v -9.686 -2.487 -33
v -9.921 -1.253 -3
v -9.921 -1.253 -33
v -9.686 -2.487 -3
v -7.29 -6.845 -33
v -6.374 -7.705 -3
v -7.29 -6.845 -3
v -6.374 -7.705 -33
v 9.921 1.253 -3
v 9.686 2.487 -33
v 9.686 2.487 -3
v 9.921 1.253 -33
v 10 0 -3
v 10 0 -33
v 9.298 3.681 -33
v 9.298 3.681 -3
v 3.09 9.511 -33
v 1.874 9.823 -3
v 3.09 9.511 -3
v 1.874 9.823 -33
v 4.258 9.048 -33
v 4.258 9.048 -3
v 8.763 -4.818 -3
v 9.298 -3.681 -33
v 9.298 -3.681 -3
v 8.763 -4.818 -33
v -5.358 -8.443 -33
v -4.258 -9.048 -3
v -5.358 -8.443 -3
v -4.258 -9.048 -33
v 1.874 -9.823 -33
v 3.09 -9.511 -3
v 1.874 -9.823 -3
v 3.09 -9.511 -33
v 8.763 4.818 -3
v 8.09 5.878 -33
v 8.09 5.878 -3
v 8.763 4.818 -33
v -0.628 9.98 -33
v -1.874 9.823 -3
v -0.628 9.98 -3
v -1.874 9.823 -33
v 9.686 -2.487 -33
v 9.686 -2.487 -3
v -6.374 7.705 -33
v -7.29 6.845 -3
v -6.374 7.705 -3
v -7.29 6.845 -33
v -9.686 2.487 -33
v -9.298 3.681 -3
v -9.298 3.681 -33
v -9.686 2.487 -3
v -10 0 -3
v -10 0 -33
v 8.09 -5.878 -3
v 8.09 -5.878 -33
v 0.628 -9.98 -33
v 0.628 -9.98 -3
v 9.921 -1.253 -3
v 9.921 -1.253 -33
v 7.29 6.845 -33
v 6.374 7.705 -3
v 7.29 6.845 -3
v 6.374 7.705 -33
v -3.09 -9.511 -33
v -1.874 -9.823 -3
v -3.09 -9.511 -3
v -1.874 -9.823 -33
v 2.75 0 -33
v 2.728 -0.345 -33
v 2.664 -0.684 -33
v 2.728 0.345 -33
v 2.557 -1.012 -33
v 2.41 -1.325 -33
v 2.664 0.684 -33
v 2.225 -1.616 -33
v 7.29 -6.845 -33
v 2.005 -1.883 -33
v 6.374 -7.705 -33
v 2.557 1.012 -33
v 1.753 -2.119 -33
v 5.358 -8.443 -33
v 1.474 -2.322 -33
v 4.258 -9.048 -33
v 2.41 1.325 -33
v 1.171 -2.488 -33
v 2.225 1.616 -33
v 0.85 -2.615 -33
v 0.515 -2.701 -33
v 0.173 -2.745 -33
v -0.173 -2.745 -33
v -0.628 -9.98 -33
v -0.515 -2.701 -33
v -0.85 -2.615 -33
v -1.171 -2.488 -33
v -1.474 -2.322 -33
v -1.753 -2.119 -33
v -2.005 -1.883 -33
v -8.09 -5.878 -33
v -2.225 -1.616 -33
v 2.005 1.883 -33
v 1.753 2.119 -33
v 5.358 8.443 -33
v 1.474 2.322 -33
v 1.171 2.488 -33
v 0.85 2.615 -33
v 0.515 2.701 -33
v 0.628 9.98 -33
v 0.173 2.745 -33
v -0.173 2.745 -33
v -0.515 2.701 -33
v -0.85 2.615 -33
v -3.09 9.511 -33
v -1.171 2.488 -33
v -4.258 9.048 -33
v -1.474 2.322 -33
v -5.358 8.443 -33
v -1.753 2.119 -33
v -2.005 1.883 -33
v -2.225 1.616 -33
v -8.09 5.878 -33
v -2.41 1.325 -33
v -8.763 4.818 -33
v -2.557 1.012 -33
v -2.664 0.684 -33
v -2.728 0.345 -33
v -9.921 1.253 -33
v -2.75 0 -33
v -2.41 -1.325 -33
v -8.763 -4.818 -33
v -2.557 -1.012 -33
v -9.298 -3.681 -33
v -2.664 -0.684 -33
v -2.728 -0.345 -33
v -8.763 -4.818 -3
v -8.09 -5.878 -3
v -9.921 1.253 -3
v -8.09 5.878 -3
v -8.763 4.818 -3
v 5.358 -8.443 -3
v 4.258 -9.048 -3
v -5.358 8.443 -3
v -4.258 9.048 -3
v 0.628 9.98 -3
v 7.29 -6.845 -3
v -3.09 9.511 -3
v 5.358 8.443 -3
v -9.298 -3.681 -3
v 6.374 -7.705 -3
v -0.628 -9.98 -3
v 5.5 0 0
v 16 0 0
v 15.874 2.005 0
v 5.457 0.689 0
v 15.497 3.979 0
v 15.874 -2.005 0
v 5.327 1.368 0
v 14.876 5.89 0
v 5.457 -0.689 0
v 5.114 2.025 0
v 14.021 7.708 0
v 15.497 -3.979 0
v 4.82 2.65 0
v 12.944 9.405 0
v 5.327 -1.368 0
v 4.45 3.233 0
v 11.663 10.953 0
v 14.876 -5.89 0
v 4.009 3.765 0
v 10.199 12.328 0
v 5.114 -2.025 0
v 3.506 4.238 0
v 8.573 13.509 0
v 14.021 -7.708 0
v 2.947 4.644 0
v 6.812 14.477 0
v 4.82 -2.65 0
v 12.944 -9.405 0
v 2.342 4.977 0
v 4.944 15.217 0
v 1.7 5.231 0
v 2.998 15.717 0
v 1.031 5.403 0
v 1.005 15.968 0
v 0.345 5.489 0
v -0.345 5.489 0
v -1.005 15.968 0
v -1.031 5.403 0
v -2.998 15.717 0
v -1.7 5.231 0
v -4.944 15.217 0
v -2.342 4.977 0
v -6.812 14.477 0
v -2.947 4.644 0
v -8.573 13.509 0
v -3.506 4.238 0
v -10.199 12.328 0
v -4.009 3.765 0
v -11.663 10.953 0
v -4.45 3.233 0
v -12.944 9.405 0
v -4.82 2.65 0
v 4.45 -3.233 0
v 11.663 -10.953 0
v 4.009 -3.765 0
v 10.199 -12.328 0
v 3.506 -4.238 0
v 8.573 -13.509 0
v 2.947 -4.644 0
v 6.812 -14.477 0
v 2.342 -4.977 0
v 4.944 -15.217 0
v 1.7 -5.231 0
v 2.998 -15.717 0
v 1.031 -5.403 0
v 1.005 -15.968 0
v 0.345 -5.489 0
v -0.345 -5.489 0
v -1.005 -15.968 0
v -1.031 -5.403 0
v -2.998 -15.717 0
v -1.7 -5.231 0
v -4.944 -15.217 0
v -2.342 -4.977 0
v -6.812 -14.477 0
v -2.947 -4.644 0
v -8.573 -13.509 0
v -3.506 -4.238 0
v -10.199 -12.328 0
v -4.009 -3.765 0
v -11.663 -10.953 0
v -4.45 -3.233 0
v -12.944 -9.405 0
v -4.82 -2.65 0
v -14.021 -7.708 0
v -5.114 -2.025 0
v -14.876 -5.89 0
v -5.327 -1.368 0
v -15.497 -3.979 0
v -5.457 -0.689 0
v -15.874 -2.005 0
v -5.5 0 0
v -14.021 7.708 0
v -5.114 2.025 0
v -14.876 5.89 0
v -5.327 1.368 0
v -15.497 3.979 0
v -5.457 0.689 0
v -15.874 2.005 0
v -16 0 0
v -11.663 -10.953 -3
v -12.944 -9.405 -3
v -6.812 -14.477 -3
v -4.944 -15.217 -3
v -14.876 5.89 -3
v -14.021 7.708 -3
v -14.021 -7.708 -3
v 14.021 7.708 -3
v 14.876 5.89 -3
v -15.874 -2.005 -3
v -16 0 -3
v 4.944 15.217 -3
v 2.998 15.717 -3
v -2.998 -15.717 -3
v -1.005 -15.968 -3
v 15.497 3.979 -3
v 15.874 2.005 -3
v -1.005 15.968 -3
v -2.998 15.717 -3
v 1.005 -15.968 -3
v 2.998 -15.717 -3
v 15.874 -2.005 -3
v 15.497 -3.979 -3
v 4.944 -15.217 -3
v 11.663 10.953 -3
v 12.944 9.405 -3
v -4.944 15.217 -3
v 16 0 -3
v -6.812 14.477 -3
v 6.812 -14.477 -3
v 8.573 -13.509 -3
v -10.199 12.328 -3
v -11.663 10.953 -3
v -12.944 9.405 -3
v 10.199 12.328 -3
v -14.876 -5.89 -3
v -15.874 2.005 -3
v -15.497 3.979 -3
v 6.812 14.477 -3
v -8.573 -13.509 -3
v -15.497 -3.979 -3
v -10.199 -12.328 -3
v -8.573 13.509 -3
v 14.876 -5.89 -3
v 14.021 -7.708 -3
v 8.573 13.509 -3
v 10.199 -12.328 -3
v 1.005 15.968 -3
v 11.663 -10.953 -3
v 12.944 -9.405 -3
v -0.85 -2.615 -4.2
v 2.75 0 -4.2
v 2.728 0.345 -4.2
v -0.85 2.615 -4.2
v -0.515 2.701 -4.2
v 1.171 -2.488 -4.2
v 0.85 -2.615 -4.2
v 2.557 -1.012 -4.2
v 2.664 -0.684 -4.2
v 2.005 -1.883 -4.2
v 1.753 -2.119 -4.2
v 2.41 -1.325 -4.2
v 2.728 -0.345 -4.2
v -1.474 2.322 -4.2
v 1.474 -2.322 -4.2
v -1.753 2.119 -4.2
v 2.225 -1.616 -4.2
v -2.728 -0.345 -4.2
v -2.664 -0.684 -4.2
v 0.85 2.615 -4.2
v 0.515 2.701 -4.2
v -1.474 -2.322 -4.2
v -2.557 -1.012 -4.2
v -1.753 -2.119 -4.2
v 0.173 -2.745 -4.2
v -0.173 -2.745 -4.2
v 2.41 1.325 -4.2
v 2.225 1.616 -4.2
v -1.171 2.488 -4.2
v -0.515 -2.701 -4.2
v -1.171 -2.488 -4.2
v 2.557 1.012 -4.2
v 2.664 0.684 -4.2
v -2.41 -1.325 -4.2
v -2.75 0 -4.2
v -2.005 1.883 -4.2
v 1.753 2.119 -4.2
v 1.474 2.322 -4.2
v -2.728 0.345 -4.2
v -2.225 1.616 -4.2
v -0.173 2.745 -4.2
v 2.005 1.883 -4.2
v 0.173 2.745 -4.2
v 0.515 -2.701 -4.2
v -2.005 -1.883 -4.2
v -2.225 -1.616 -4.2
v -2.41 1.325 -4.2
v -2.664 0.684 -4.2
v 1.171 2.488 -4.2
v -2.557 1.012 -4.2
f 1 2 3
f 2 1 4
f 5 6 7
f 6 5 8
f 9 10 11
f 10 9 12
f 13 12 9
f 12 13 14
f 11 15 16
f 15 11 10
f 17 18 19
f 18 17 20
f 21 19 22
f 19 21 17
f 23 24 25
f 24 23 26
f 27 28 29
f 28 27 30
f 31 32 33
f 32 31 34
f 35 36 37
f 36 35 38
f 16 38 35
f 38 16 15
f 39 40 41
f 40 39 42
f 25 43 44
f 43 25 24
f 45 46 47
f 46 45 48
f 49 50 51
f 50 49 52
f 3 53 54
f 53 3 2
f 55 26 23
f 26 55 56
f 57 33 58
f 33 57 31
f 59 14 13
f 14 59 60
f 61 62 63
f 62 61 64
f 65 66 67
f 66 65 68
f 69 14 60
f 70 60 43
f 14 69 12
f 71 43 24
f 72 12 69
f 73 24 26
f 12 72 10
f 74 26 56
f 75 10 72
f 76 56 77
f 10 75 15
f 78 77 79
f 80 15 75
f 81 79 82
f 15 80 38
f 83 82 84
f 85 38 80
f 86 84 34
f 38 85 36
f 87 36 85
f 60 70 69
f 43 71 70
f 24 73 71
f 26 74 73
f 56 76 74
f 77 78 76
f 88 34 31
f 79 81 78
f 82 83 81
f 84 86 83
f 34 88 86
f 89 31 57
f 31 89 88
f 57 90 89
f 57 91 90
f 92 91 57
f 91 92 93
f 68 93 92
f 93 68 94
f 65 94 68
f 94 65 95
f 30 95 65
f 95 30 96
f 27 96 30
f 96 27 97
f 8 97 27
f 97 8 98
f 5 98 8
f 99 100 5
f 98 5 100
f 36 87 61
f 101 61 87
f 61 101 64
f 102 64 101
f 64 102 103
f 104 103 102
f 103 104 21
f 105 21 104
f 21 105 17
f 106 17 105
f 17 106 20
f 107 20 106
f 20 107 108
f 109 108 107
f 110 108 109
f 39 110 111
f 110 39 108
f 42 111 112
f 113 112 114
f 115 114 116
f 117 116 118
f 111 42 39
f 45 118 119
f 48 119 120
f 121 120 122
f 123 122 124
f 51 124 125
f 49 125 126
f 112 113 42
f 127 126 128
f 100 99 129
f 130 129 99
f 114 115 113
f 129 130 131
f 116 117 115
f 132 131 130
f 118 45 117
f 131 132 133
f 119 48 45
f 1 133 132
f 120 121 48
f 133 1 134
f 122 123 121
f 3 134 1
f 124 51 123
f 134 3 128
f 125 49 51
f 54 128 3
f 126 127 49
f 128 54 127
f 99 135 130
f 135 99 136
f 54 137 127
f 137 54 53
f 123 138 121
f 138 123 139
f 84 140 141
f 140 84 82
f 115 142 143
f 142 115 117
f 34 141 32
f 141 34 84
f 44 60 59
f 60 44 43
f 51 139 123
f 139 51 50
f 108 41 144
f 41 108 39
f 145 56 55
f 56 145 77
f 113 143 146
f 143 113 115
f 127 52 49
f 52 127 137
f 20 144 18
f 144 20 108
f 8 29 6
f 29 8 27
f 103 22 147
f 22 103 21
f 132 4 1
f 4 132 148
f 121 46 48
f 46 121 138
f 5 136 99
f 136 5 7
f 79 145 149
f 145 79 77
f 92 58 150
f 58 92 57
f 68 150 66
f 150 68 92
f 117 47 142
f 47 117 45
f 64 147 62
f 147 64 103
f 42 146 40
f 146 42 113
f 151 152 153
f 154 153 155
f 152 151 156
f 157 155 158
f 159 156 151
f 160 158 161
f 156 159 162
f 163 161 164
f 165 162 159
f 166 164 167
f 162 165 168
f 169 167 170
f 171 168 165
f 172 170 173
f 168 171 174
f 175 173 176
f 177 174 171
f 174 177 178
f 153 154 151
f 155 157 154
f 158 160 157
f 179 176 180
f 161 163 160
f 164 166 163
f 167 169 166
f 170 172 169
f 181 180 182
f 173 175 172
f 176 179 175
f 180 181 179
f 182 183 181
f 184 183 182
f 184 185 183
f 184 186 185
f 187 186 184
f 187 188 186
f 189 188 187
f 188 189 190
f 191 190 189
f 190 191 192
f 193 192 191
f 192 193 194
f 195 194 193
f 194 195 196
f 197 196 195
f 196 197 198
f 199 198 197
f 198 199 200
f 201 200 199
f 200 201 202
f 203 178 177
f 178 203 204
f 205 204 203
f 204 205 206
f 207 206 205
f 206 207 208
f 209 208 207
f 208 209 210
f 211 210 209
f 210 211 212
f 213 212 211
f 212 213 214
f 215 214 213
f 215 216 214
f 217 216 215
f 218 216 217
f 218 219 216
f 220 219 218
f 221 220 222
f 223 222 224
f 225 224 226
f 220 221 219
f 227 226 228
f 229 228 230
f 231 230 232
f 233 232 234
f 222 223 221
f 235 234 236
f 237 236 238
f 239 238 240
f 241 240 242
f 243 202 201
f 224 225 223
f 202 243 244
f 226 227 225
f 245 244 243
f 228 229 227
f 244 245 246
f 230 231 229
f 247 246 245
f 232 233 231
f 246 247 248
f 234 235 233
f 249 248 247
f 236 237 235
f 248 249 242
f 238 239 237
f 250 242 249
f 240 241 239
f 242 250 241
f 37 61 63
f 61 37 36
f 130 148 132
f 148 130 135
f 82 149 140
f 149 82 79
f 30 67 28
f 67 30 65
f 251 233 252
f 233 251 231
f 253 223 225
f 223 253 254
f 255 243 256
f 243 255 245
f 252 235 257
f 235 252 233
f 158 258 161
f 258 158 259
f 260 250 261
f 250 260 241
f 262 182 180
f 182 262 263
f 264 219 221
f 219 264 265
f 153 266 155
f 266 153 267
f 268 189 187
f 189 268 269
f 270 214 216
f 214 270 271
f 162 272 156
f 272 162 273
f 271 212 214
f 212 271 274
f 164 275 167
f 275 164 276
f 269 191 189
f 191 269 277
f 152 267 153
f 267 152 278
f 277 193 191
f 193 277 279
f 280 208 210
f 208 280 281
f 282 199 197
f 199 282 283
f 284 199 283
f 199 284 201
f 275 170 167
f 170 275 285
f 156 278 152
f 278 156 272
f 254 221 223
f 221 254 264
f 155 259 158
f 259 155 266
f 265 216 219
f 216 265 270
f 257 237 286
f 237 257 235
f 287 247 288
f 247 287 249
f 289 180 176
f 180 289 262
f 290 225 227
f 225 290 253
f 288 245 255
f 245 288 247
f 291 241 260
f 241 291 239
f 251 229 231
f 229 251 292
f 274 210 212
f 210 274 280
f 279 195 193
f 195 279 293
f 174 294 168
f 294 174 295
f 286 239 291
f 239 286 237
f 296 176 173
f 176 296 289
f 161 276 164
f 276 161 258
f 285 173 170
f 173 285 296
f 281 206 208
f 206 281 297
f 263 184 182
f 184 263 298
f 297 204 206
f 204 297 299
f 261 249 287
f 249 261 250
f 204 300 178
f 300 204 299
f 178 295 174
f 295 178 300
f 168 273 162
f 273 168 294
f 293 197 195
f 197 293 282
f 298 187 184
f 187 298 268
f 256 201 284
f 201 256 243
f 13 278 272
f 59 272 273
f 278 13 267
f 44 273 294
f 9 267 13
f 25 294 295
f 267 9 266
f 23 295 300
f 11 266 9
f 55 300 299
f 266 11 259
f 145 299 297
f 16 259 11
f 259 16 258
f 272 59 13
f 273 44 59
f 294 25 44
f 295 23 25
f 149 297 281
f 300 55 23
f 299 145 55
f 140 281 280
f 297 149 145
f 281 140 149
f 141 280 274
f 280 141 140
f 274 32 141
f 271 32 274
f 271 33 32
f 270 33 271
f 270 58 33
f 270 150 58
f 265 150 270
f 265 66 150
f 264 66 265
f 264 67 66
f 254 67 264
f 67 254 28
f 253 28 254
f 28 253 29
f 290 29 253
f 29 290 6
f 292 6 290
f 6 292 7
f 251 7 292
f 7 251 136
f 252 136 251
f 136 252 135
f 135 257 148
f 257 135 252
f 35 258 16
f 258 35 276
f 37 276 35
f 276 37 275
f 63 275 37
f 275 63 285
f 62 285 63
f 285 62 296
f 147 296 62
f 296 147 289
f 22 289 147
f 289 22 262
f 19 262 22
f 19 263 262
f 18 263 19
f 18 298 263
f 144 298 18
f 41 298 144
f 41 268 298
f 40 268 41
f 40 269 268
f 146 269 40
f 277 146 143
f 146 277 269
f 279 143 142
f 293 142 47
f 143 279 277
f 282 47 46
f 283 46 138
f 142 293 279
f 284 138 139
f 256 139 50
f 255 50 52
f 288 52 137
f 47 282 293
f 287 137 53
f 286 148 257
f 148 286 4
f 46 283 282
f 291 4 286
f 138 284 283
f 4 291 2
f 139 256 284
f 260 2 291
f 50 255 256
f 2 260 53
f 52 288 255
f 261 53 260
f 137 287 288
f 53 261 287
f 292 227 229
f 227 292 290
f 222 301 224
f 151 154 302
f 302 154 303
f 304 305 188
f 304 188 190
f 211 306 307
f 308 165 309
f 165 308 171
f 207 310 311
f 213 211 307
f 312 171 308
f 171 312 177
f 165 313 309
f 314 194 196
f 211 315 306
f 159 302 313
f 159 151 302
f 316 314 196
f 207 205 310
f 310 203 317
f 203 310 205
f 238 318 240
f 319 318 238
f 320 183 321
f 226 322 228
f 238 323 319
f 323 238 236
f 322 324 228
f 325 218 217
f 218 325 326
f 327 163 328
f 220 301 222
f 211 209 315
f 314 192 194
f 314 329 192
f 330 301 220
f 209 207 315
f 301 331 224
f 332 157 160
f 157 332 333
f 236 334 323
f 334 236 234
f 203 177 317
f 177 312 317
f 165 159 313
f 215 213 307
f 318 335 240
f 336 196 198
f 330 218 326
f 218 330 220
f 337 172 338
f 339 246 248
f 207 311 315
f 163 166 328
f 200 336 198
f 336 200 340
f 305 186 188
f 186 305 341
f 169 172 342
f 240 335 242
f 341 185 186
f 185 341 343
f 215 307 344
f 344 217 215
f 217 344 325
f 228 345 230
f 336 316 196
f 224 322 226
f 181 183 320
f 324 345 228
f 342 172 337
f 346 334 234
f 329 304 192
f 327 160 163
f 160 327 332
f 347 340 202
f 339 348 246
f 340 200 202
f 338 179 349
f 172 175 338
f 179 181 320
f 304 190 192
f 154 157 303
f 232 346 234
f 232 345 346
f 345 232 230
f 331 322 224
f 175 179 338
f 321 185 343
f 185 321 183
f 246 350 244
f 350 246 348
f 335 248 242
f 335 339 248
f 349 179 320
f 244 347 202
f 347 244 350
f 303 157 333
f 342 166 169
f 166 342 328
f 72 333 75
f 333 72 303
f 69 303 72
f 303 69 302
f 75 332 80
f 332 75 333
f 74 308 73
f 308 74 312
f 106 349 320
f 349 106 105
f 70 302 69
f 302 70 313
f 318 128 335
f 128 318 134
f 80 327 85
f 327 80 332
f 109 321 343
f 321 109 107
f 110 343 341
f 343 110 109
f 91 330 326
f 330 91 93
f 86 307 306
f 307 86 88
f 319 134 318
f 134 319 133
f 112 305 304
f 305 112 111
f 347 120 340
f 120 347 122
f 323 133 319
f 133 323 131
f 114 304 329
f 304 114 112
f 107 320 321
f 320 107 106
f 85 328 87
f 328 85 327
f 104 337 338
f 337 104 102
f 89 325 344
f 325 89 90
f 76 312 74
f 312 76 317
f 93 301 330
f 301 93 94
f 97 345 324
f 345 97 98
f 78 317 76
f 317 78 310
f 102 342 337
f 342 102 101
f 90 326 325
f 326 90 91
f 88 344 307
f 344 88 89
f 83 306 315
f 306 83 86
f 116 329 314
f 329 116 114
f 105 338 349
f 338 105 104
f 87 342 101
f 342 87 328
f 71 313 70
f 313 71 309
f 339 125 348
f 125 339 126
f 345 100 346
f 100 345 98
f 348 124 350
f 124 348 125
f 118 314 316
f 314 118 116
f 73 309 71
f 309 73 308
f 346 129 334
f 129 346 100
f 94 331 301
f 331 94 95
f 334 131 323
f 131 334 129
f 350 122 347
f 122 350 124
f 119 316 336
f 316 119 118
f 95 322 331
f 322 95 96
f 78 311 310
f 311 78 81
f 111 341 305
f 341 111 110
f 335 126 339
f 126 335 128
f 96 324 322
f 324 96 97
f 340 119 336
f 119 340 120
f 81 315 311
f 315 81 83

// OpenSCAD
$fn = 50;


difference() {
	union() {
		translate(v = [0, 0, -33.0000000000]) {
			cylinder(h = 33, r = 10.0000000000);
		}
		translate(v = [0, 0, -3.0000000000]) {
			cylinder(h = 3, r = 16.0000000000);
		}
	}
	union() {
		translate(v = [0, 0, 0]) {
			rotate(a = [0, 0, 0]) {
				difference() {
					union() {
						#translate(v = [0, 0, -33.0000000000]) {
							cylinder(h = 33, r = 2.2500000000);
						}
						#translate(v = [0, 0, -4.2000000000]) {
							cylinder(h = 4.2000000000, r = 10.0000000000, r1 = 2.7500000000, r2 = 5.5000000000);
						}
						#translate(v = [0, 0, -33.0000000000]) {
							cylinder(h = 33, r = 2.7500000000);
						}
						#translate(v = [0, 0, -33.0000000000]) {
							cylinder(h = 33, r = 2.2500000000);
						}
					}
					union();
				}
			}
		}
	}
}
